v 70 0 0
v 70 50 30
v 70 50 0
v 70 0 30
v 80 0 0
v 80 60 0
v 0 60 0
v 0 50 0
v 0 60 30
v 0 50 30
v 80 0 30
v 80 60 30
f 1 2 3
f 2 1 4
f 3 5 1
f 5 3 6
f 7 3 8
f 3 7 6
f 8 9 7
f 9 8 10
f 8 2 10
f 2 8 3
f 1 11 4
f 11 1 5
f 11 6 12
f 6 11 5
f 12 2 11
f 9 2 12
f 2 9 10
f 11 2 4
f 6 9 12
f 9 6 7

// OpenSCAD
// Two-part box enclosure for a small electronics board (e.g. an Arduino-based temperature logger),
// printed as one piece with a part between them. NOVEL general part.
//

box_x   = 70;
box_y   = 50;
box_z   = 30;
wall    = 2;
floor   = 2;

lip_t   = 1.5;
lip_h   = 4;
clearance = 0.2;

$fn = 48;

part_size_x = box_x + 10;
part_size_y = box_y + 10;
part_size_z = max(box_z, floor + lip_h + lip_t);      // tall enough for the box and the lip

difference() {
    cube([part_size_x, part_size_y, part_size_z]);
    for (p = [box_x + 5, box_y + 5])
        translate(p) cube([box_x, box_y, box_z + 1]);   // hollow the first (taller) part
}
